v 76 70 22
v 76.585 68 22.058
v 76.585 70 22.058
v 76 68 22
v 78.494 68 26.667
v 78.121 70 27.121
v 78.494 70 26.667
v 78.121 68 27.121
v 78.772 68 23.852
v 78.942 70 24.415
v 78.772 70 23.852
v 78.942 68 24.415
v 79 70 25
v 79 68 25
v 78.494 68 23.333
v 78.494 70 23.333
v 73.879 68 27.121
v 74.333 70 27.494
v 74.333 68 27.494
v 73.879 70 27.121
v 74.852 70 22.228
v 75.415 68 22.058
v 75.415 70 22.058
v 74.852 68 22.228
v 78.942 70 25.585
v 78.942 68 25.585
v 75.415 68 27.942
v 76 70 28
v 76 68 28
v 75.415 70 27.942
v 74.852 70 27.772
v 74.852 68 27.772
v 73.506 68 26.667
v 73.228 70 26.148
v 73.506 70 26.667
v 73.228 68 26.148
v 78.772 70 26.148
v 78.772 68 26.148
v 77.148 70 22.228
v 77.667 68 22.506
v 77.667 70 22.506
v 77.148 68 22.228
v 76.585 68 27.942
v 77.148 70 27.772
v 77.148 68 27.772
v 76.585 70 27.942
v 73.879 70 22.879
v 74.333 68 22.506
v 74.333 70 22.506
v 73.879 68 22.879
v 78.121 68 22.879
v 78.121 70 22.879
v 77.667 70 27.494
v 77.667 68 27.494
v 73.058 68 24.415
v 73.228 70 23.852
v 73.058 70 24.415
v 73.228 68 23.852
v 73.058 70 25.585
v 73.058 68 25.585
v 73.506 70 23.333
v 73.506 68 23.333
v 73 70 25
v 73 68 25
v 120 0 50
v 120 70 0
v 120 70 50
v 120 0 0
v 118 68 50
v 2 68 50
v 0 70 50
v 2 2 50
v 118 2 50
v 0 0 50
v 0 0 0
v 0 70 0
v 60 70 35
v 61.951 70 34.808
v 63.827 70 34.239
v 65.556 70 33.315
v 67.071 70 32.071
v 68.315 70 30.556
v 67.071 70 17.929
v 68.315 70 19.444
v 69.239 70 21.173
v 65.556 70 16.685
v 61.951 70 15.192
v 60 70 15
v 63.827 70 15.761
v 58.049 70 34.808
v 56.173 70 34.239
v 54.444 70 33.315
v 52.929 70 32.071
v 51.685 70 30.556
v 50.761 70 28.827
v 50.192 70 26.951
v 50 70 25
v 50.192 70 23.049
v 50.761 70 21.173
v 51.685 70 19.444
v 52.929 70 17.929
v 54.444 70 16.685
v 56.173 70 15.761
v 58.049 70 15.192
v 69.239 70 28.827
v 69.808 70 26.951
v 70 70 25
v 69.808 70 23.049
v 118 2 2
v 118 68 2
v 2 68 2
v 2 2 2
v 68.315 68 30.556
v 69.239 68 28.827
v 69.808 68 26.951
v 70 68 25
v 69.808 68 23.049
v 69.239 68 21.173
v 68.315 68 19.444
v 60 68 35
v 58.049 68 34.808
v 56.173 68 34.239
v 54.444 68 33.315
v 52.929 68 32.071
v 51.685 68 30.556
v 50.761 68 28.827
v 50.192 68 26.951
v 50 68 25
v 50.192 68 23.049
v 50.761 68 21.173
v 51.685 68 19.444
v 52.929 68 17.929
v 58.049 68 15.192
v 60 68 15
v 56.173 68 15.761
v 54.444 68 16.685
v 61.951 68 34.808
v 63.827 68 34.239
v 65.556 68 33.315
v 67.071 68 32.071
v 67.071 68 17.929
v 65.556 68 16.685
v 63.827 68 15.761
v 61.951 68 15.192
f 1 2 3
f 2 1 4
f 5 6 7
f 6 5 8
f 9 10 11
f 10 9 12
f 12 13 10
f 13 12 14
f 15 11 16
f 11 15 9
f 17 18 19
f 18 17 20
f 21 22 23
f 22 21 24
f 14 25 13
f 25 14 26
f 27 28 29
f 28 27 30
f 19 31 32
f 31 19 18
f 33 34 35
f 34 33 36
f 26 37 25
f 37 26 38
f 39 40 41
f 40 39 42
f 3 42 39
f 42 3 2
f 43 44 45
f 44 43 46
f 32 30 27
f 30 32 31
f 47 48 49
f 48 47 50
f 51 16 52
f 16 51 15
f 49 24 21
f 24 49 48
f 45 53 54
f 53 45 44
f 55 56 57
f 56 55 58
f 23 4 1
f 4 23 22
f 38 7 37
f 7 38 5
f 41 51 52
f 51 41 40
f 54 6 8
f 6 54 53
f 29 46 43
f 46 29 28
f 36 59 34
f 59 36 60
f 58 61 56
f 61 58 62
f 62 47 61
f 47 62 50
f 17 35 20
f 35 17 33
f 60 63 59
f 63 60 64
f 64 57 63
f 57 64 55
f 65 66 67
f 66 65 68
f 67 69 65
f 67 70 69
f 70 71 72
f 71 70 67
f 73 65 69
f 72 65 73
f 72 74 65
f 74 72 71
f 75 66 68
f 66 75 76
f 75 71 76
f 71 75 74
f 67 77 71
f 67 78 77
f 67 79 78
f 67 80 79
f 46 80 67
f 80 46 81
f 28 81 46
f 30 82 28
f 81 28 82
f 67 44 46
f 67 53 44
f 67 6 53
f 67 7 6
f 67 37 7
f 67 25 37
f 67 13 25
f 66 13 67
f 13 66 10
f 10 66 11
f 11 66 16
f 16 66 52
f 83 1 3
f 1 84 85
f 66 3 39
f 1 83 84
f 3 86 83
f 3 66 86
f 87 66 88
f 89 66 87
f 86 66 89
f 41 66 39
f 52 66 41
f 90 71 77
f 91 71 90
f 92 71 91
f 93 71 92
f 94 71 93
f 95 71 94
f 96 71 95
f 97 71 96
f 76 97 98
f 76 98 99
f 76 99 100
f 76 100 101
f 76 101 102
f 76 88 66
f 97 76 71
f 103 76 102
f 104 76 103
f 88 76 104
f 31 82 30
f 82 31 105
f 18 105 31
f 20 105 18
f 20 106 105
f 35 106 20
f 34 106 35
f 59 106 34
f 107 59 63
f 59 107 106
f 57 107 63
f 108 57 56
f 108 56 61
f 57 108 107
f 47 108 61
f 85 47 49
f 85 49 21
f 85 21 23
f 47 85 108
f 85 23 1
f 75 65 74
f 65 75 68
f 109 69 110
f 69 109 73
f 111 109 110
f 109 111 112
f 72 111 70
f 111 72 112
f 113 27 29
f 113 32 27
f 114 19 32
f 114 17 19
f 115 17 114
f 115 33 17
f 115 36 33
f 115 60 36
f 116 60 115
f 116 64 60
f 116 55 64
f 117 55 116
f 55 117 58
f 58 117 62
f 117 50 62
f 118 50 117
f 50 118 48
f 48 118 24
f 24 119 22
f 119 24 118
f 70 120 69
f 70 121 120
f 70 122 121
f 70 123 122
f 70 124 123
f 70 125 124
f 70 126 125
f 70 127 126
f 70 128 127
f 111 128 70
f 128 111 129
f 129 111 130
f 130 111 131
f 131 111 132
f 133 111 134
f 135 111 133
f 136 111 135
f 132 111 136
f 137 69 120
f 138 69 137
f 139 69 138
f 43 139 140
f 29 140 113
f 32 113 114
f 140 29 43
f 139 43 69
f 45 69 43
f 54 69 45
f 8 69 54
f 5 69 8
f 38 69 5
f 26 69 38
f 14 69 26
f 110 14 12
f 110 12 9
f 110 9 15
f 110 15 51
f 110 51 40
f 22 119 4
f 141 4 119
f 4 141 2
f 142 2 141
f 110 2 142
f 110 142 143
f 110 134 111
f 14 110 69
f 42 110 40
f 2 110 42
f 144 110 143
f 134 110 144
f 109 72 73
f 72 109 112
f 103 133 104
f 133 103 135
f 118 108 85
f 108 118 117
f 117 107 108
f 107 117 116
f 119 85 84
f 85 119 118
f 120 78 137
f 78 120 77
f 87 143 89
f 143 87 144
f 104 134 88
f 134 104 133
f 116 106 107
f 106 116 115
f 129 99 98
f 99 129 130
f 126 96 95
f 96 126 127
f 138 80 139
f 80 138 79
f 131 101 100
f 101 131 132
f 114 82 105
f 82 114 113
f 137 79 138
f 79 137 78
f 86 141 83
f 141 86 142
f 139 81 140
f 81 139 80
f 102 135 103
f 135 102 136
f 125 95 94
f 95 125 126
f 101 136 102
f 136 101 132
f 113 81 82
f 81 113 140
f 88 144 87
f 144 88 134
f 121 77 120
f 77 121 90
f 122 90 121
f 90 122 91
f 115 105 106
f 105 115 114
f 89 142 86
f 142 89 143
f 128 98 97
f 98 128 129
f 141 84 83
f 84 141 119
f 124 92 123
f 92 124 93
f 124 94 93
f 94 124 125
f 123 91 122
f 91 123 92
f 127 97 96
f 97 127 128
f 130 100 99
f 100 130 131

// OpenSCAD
$fn = 32;

// ----------------------------------------------------------------------
// Vent box: roundvent enclosure
// ----------------------------------------------------------------------

// --- parameters (mm) ---
box_l = 120;              // box length, X
box_w = 70;               // box width, Y
box_h = 50;               // box height, Z
wall_t = 2;               // shell wall thickness
vent_d = 20;              // central vent diameter
ring_d = 6;               // ring hole diameter
n_ring = 8;               // holes in the ring
ring_r = 16;              // ring radius

ring_step = 360 / n_ring;  // ring hole angular step

difference() {
  cube([box_l, box_w, box_h]);
  translate([wall_t, wall_t, wall_t])
    cube([box_l - 2 * wall_t, box_w - 2 * wall_t, box_h]);
  translate([box_l / 2, box_w - wall_t - 1, box_h / 2])
    rotate([-90, 0, 0]) cylinder(h = wall_t + 2, d = vent_d);
  for (i = [0 : n_ring - 1])
    translate([box_l / 2, box_w - wall_t - 1, box_h / 2])
      rotate([0, 0, i * ring_step])
        translate([ring_r, 0, 0]) rotate([-90, 0, 0])
          cylinder(h = wall_t + 2, d = ring_d);
}
